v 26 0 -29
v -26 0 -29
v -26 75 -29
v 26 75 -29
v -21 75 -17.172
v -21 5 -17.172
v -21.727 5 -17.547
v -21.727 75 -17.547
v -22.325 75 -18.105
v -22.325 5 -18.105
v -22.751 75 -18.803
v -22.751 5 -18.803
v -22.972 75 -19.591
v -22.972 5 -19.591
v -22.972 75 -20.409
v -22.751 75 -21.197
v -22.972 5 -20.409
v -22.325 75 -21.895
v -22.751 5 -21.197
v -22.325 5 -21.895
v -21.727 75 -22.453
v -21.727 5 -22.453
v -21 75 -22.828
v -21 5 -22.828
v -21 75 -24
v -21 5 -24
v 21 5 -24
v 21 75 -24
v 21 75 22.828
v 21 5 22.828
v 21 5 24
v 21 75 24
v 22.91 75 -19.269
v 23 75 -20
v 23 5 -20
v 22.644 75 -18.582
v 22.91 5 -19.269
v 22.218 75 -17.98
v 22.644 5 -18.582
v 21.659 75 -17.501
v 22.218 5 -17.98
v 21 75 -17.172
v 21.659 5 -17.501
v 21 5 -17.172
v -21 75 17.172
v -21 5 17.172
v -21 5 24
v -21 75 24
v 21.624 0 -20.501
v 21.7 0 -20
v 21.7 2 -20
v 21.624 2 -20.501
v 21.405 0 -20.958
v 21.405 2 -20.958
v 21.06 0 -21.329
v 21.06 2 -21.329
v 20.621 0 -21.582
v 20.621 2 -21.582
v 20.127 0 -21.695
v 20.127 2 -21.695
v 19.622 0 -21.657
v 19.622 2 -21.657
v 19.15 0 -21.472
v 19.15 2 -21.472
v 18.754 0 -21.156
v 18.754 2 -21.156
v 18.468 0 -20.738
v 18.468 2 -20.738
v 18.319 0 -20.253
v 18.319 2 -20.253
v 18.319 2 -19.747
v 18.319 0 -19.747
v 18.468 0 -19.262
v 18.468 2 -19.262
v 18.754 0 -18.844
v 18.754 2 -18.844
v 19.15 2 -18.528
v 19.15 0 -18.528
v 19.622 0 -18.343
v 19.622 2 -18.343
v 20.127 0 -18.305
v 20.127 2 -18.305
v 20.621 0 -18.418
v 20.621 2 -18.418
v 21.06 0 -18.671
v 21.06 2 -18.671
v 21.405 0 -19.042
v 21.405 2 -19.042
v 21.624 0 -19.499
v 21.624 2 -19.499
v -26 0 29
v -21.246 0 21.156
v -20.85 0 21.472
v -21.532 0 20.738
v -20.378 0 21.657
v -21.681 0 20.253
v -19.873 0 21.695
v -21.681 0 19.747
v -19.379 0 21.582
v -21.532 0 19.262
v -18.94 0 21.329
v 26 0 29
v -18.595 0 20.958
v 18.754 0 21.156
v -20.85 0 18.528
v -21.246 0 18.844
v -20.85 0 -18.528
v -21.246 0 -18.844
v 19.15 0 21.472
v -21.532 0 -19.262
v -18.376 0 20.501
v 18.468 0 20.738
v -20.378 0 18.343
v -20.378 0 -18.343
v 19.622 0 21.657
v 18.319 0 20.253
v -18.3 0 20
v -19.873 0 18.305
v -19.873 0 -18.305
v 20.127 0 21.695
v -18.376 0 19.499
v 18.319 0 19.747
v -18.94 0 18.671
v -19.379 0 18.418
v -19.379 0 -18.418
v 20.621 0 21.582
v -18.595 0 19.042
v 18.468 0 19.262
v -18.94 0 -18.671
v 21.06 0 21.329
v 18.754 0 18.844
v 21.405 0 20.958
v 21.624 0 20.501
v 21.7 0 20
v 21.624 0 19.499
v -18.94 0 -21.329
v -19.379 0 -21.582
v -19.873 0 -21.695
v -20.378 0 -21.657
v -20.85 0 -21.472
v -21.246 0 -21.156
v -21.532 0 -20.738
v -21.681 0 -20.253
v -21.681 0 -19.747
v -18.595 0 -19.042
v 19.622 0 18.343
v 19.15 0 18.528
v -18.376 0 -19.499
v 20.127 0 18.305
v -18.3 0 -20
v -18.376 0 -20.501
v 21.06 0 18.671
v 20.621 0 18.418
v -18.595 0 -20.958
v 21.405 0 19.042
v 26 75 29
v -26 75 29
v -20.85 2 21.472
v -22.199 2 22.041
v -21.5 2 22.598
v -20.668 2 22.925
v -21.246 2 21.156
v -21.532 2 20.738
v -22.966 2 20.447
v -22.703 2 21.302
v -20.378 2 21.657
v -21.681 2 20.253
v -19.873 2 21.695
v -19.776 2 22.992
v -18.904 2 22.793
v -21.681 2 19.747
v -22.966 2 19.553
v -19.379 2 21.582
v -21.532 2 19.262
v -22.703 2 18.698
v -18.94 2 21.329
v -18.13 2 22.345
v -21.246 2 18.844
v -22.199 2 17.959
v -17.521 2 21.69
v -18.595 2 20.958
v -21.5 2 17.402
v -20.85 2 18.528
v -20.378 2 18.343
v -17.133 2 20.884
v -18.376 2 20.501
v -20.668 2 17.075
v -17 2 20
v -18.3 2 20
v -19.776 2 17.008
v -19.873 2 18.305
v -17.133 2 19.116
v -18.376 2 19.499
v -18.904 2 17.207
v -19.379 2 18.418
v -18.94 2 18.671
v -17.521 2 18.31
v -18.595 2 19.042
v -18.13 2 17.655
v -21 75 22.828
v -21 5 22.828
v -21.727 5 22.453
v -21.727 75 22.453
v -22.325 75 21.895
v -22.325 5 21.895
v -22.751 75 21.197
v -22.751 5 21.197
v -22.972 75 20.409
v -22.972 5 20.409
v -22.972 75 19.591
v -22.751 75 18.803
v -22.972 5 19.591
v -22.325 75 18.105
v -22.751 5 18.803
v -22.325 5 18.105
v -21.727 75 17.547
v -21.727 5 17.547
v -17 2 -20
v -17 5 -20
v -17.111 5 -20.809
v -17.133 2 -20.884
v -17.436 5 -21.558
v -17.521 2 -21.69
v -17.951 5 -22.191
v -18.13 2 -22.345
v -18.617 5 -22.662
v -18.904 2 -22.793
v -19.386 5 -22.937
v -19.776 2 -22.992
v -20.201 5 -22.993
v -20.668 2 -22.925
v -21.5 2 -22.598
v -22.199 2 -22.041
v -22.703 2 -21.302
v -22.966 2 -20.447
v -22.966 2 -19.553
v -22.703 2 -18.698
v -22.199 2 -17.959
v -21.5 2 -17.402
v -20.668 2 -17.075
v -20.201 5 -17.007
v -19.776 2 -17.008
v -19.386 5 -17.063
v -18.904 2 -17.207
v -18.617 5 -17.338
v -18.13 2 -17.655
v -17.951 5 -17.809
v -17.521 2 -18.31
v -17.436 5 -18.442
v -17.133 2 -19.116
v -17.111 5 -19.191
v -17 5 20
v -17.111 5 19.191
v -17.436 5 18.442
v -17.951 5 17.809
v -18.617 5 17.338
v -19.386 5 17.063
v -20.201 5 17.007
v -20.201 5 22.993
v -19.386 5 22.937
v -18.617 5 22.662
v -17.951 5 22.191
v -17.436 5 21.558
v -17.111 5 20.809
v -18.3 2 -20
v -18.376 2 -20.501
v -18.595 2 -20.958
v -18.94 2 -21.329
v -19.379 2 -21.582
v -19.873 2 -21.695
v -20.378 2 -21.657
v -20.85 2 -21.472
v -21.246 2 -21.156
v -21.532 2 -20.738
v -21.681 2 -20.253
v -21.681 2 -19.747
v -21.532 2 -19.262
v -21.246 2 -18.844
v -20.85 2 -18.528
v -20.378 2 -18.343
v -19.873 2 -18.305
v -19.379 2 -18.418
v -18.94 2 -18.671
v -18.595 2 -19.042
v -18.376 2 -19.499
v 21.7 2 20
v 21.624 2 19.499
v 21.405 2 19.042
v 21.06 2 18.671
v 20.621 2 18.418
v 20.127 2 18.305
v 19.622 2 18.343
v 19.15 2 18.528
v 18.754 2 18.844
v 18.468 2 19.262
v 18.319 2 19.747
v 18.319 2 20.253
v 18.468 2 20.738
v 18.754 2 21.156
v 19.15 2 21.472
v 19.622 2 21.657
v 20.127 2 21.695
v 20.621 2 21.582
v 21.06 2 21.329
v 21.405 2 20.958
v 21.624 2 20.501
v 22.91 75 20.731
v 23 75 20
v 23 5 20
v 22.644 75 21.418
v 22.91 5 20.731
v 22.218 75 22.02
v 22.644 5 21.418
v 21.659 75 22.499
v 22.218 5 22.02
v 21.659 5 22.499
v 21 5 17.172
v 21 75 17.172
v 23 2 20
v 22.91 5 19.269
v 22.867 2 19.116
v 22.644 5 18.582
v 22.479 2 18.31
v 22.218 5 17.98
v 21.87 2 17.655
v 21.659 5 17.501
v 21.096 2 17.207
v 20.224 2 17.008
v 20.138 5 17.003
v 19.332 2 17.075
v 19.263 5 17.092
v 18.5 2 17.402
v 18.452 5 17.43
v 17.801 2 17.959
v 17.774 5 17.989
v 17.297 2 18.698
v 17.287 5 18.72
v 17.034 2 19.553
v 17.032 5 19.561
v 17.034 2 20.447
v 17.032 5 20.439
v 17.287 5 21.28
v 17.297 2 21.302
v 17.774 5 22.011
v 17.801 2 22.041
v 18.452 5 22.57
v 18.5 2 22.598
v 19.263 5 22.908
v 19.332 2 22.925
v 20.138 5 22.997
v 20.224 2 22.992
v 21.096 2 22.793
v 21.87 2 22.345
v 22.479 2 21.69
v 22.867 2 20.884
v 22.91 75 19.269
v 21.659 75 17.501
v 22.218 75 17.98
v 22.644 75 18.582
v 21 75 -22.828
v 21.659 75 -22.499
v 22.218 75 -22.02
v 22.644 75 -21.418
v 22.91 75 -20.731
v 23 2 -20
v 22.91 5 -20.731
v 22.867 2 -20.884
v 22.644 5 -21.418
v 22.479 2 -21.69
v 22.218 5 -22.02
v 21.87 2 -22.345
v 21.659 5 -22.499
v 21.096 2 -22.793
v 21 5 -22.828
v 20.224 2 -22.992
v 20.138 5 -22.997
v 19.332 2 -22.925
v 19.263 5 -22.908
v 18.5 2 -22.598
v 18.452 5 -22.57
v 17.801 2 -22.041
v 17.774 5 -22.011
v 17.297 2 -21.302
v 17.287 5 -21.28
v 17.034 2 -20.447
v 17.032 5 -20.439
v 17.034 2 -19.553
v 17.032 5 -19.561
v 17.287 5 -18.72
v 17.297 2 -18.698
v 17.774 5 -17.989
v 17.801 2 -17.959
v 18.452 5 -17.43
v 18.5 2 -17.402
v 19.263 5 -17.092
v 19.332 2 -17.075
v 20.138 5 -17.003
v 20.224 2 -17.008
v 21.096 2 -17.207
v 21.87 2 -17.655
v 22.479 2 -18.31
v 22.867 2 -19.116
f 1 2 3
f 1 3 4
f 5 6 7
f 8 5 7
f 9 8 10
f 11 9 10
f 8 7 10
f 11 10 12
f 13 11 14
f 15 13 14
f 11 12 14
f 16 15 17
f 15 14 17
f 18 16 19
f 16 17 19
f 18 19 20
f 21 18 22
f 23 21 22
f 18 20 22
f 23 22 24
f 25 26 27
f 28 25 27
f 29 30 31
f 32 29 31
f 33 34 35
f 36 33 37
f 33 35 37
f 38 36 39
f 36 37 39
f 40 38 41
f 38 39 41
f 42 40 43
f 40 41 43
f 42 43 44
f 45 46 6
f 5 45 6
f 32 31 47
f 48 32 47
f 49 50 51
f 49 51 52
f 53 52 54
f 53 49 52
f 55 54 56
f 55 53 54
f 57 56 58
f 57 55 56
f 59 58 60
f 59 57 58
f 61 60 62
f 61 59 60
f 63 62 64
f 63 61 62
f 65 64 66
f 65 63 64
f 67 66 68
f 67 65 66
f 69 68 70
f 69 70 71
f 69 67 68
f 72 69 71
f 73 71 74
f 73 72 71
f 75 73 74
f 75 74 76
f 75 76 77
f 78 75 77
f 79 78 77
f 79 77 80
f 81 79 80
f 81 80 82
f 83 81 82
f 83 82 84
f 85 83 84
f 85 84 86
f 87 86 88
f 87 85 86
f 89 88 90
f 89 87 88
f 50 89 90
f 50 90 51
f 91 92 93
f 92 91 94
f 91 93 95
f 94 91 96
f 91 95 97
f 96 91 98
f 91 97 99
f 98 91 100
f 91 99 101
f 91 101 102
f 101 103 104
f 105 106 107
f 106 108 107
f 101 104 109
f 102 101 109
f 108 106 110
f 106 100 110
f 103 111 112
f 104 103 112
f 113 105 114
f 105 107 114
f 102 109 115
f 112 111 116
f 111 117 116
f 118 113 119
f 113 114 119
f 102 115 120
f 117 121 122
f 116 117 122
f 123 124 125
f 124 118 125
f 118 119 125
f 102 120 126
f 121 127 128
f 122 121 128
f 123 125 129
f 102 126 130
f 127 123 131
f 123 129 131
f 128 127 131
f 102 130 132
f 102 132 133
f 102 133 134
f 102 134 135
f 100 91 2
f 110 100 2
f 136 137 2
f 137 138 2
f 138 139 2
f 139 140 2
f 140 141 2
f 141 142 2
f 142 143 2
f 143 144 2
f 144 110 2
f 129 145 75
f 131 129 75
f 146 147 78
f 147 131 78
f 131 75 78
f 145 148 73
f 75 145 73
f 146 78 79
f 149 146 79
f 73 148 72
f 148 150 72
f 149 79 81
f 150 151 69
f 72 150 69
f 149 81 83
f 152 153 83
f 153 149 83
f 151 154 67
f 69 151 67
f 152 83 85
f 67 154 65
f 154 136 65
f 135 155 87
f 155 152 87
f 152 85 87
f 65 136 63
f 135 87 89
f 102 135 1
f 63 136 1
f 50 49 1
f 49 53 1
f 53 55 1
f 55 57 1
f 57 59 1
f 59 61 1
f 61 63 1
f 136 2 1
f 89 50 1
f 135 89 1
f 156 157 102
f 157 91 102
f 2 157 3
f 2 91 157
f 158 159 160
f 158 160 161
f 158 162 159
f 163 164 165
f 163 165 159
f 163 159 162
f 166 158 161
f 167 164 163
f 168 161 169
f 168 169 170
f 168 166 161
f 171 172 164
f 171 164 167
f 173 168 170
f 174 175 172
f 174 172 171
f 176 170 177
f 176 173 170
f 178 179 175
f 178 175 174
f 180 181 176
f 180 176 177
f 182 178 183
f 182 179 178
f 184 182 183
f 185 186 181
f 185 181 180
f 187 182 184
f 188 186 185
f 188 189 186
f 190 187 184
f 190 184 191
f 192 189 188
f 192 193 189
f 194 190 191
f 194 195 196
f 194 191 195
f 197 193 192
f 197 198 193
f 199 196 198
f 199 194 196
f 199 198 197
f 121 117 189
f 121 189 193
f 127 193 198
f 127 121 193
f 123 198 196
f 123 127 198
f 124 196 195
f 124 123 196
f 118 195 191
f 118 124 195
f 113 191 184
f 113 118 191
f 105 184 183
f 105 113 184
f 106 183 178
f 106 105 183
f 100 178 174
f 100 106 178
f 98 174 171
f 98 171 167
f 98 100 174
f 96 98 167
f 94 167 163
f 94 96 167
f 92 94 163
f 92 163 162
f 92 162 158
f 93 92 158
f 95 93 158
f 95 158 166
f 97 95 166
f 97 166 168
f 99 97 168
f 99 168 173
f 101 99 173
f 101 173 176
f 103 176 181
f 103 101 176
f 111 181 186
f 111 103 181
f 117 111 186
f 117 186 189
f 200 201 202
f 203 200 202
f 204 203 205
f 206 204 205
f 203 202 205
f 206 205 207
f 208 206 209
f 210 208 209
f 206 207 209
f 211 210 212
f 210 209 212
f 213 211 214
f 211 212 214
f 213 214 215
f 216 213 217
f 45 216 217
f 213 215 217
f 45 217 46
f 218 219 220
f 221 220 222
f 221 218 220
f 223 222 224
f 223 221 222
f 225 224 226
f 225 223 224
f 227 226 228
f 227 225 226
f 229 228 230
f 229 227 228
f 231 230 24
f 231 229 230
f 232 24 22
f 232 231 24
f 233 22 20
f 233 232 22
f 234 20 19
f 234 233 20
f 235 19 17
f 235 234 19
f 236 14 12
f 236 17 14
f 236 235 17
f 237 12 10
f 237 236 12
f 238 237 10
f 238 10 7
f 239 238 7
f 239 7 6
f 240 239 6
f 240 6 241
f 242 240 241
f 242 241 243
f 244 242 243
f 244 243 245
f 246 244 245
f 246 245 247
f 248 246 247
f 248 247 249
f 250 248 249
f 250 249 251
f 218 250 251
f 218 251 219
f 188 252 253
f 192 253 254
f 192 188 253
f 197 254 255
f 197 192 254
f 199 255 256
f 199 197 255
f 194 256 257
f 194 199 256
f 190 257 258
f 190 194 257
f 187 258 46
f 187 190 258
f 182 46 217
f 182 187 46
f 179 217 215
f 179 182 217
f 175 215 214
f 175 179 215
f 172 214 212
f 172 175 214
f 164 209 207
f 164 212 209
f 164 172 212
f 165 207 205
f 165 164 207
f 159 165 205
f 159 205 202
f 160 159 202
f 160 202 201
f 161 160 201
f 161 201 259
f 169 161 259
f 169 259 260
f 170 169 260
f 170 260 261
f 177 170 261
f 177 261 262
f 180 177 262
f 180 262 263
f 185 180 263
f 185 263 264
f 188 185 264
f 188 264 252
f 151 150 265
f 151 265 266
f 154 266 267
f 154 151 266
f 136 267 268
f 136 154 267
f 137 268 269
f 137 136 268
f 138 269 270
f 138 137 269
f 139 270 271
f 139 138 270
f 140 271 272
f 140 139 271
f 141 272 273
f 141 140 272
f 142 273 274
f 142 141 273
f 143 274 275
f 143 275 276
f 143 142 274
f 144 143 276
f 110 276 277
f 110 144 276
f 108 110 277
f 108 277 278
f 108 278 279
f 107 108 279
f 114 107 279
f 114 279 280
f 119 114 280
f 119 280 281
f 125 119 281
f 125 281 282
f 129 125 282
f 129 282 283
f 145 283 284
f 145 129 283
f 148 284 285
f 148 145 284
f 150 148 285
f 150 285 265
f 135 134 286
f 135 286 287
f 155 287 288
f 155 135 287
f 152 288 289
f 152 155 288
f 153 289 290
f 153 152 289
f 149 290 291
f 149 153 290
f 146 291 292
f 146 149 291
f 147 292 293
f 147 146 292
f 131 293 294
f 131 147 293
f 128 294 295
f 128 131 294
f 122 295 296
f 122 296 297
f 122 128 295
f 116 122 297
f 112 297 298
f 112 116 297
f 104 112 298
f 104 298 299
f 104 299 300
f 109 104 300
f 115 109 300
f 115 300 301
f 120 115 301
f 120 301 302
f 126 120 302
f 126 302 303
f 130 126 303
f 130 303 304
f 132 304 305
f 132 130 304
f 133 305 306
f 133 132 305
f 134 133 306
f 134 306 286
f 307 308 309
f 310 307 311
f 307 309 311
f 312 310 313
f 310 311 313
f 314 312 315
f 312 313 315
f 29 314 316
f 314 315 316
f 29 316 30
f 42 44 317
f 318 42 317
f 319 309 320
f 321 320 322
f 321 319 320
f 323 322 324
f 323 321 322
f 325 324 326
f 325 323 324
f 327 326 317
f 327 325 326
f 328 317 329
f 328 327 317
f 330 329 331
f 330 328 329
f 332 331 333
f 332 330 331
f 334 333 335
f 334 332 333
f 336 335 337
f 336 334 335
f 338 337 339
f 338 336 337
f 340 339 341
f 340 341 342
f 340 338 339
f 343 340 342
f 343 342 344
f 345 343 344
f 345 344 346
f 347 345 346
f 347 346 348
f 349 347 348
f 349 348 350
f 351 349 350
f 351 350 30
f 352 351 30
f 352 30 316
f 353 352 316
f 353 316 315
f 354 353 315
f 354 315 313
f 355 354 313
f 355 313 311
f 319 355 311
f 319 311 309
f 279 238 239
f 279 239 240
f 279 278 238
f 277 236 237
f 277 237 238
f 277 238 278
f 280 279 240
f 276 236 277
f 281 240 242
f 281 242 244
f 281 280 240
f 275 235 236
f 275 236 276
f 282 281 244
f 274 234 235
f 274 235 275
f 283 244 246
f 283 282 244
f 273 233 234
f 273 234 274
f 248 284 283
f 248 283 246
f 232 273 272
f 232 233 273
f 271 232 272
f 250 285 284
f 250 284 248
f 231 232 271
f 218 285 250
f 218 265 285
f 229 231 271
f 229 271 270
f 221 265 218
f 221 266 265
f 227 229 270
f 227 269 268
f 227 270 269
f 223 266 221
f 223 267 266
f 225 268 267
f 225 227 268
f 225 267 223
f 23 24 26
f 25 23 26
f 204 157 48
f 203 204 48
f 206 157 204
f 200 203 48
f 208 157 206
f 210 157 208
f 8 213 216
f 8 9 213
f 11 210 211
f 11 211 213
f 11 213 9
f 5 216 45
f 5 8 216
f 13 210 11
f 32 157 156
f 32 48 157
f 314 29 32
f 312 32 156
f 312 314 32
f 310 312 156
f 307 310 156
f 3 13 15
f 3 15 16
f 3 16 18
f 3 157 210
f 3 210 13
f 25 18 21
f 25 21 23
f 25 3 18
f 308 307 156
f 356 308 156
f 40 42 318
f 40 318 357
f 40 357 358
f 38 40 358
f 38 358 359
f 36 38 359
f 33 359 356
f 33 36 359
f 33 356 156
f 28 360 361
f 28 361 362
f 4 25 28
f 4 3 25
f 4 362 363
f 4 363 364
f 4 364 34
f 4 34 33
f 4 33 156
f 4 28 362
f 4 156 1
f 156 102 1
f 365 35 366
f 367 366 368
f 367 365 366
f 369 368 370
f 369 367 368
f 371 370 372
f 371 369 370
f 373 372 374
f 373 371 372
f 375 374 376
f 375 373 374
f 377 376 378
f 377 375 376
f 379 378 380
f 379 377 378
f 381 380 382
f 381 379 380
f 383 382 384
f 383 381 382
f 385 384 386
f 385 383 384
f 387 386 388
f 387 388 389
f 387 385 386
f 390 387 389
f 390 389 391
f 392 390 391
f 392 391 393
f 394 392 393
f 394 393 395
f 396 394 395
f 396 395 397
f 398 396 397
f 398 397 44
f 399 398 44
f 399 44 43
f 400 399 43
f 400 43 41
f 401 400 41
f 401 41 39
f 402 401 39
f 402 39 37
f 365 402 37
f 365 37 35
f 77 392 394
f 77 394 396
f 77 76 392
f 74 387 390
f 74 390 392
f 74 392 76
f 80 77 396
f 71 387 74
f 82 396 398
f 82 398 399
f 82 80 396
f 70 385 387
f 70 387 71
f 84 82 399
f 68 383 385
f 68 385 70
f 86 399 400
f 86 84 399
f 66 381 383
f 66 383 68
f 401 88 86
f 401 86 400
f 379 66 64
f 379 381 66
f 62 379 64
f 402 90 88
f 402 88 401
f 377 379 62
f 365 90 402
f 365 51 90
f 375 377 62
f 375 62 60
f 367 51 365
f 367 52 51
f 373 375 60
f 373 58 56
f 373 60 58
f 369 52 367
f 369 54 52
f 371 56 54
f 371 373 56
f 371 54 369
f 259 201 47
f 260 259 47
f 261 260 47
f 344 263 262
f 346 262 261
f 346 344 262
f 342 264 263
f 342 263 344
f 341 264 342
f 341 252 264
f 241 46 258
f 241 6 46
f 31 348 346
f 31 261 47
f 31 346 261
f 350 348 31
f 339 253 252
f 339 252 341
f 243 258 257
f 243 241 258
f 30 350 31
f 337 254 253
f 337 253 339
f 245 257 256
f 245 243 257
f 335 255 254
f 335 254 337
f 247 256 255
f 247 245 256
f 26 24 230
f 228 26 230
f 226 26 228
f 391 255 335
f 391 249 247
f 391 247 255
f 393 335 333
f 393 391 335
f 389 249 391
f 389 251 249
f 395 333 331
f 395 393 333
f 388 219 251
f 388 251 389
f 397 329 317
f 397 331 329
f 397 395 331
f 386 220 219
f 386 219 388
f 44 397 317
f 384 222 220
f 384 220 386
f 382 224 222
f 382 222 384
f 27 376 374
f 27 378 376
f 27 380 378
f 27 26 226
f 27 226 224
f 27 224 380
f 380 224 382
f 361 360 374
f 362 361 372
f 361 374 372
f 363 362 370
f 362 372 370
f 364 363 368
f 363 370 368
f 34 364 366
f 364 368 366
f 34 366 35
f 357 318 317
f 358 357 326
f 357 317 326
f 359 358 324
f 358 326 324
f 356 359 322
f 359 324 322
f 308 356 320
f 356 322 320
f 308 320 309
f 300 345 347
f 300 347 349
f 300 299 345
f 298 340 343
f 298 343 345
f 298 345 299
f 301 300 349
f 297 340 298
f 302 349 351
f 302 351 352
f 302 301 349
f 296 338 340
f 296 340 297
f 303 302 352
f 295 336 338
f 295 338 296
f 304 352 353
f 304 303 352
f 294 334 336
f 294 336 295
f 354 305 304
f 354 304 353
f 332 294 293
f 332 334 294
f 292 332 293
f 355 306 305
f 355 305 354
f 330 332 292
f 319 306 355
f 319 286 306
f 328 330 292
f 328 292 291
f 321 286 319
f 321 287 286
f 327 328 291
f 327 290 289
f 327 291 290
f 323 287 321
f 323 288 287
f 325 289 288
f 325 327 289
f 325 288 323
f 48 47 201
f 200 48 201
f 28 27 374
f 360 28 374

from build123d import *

# Parameters (mm, degrees)
SKETCH1_W           = 52
SKETCH1_H           = 58
SKETCH1_R           = 1.7
BOSS_EXTRUDE1_DEPTH = 2
SKETCH2_W           = 52
SKETCH2_H           = 58
SKETCH2_R           = 3
BOSS_EXTRUDE2_DEPTH = 3
SKETCH3_W           = 52
SKETCH3_H           = 58
BOSS_EXTRUDE3_DEPTH = 70


with BuildPart() as part:
    # Sketch1 → Boss-Extrude1 (new body)
    with BuildSketch(Plane(origin=(0, 0, 0), x_dir=(1, 0, 0), z_dir=(0, 1, 0))):
        Rectangle(SKETCH1_W, SKETCH1_H)
        with Locations((-20, 20)):
            Circle(SKETCH1_R, mode=Mode.SUBTRACT)
        with Locations((-20, -20)):
            Circle(SKETCH1_R, mode=Mode.SUBTRACT)
        with Locations((20, -20)):
            Circle(SKETCH1_R, mode=Mode.SUBTRACT)
        with Locations((20, 20)):
            Circle(SKETCH1_R, mode=Mode.SUBTRACT)
    extrude(amount=BOSS_EXTRUDE1_DEPTH)

    # Sketch2 → Boss-Extrude2 (add)
    with BuildSketch(Plane(origin=(0, 2, 0), x_dir=(1, 0, 0), z_dir=(0, 1, 0))):
        Rectangle(SKETCH2_W, SKETCH2_H)
        with Locations((-20, 20)):
            Circle(SKETCH2_R, mode=Mode.SUBTRACT)
        with Locations((-20, -20)):
            Circle(SKETCH2_R, mode=Mode.SUBTRACT)
        with Locations((20, 20)):
            Circle(SKETCH2_R, mode=Mode.SUBTRACT)
        with Locations((20, -20)):
            Circle(SKETCH2_R, mode=Mode.SUBTRACT)
    extrude(amount=BOSS_EXTRUDE2_DEPTH)

    # Sketch3 → Boss-Extrude3 (add)
    with BuildSketch(Plane(origin=(0, 5, 0), x_dir=(1, 0, 0), z_dir=(0, 1, 0))):
        Rectangle(SKETCH3_W, SKETCH3_H)
        with BuildLine():
            Line((-21, 22.828427125), (-21, 24))
            Line((-21, 24), (21, 24))
            Line((21, 24), (21, 22.828427125))
            ThreePointArc((21, 22.828427125), (22.449489743, 21.732050808), (23, 20))
            ThreePointArc((23, 20), (22.449489743, 18.267949192), (21, 17.171572875))
            Line((21, 17.171572875), (21, -17.171572875))
            ThreePointArc((21, -17.171572875), (22.449489743, -18.267949192), (23, -20))
            ThreePointArc((23, -20), (22.449489743, -21.732050808), (21, -22.828427125))
            Line((21, -22.828427125), (21, -24))
            Line((21, -24), (-21, -24))
            Line((-21, -24), (-21, -22.828427125))
            ThreePointArc((-21, -22.828427125), (-23, -20), (-21, -17.171572875))
            Line((-21, -17.171572875), (-21, 17.171572875))
            ThreePointArc((-21, 17.171572875), (-23, 20), (-21, 22.828427125))
        make_face(mode=Mode.SUBTRACT)
    extrude(amount=BOSS_EXTRUDE3_DEPTH)


solid = part.part
